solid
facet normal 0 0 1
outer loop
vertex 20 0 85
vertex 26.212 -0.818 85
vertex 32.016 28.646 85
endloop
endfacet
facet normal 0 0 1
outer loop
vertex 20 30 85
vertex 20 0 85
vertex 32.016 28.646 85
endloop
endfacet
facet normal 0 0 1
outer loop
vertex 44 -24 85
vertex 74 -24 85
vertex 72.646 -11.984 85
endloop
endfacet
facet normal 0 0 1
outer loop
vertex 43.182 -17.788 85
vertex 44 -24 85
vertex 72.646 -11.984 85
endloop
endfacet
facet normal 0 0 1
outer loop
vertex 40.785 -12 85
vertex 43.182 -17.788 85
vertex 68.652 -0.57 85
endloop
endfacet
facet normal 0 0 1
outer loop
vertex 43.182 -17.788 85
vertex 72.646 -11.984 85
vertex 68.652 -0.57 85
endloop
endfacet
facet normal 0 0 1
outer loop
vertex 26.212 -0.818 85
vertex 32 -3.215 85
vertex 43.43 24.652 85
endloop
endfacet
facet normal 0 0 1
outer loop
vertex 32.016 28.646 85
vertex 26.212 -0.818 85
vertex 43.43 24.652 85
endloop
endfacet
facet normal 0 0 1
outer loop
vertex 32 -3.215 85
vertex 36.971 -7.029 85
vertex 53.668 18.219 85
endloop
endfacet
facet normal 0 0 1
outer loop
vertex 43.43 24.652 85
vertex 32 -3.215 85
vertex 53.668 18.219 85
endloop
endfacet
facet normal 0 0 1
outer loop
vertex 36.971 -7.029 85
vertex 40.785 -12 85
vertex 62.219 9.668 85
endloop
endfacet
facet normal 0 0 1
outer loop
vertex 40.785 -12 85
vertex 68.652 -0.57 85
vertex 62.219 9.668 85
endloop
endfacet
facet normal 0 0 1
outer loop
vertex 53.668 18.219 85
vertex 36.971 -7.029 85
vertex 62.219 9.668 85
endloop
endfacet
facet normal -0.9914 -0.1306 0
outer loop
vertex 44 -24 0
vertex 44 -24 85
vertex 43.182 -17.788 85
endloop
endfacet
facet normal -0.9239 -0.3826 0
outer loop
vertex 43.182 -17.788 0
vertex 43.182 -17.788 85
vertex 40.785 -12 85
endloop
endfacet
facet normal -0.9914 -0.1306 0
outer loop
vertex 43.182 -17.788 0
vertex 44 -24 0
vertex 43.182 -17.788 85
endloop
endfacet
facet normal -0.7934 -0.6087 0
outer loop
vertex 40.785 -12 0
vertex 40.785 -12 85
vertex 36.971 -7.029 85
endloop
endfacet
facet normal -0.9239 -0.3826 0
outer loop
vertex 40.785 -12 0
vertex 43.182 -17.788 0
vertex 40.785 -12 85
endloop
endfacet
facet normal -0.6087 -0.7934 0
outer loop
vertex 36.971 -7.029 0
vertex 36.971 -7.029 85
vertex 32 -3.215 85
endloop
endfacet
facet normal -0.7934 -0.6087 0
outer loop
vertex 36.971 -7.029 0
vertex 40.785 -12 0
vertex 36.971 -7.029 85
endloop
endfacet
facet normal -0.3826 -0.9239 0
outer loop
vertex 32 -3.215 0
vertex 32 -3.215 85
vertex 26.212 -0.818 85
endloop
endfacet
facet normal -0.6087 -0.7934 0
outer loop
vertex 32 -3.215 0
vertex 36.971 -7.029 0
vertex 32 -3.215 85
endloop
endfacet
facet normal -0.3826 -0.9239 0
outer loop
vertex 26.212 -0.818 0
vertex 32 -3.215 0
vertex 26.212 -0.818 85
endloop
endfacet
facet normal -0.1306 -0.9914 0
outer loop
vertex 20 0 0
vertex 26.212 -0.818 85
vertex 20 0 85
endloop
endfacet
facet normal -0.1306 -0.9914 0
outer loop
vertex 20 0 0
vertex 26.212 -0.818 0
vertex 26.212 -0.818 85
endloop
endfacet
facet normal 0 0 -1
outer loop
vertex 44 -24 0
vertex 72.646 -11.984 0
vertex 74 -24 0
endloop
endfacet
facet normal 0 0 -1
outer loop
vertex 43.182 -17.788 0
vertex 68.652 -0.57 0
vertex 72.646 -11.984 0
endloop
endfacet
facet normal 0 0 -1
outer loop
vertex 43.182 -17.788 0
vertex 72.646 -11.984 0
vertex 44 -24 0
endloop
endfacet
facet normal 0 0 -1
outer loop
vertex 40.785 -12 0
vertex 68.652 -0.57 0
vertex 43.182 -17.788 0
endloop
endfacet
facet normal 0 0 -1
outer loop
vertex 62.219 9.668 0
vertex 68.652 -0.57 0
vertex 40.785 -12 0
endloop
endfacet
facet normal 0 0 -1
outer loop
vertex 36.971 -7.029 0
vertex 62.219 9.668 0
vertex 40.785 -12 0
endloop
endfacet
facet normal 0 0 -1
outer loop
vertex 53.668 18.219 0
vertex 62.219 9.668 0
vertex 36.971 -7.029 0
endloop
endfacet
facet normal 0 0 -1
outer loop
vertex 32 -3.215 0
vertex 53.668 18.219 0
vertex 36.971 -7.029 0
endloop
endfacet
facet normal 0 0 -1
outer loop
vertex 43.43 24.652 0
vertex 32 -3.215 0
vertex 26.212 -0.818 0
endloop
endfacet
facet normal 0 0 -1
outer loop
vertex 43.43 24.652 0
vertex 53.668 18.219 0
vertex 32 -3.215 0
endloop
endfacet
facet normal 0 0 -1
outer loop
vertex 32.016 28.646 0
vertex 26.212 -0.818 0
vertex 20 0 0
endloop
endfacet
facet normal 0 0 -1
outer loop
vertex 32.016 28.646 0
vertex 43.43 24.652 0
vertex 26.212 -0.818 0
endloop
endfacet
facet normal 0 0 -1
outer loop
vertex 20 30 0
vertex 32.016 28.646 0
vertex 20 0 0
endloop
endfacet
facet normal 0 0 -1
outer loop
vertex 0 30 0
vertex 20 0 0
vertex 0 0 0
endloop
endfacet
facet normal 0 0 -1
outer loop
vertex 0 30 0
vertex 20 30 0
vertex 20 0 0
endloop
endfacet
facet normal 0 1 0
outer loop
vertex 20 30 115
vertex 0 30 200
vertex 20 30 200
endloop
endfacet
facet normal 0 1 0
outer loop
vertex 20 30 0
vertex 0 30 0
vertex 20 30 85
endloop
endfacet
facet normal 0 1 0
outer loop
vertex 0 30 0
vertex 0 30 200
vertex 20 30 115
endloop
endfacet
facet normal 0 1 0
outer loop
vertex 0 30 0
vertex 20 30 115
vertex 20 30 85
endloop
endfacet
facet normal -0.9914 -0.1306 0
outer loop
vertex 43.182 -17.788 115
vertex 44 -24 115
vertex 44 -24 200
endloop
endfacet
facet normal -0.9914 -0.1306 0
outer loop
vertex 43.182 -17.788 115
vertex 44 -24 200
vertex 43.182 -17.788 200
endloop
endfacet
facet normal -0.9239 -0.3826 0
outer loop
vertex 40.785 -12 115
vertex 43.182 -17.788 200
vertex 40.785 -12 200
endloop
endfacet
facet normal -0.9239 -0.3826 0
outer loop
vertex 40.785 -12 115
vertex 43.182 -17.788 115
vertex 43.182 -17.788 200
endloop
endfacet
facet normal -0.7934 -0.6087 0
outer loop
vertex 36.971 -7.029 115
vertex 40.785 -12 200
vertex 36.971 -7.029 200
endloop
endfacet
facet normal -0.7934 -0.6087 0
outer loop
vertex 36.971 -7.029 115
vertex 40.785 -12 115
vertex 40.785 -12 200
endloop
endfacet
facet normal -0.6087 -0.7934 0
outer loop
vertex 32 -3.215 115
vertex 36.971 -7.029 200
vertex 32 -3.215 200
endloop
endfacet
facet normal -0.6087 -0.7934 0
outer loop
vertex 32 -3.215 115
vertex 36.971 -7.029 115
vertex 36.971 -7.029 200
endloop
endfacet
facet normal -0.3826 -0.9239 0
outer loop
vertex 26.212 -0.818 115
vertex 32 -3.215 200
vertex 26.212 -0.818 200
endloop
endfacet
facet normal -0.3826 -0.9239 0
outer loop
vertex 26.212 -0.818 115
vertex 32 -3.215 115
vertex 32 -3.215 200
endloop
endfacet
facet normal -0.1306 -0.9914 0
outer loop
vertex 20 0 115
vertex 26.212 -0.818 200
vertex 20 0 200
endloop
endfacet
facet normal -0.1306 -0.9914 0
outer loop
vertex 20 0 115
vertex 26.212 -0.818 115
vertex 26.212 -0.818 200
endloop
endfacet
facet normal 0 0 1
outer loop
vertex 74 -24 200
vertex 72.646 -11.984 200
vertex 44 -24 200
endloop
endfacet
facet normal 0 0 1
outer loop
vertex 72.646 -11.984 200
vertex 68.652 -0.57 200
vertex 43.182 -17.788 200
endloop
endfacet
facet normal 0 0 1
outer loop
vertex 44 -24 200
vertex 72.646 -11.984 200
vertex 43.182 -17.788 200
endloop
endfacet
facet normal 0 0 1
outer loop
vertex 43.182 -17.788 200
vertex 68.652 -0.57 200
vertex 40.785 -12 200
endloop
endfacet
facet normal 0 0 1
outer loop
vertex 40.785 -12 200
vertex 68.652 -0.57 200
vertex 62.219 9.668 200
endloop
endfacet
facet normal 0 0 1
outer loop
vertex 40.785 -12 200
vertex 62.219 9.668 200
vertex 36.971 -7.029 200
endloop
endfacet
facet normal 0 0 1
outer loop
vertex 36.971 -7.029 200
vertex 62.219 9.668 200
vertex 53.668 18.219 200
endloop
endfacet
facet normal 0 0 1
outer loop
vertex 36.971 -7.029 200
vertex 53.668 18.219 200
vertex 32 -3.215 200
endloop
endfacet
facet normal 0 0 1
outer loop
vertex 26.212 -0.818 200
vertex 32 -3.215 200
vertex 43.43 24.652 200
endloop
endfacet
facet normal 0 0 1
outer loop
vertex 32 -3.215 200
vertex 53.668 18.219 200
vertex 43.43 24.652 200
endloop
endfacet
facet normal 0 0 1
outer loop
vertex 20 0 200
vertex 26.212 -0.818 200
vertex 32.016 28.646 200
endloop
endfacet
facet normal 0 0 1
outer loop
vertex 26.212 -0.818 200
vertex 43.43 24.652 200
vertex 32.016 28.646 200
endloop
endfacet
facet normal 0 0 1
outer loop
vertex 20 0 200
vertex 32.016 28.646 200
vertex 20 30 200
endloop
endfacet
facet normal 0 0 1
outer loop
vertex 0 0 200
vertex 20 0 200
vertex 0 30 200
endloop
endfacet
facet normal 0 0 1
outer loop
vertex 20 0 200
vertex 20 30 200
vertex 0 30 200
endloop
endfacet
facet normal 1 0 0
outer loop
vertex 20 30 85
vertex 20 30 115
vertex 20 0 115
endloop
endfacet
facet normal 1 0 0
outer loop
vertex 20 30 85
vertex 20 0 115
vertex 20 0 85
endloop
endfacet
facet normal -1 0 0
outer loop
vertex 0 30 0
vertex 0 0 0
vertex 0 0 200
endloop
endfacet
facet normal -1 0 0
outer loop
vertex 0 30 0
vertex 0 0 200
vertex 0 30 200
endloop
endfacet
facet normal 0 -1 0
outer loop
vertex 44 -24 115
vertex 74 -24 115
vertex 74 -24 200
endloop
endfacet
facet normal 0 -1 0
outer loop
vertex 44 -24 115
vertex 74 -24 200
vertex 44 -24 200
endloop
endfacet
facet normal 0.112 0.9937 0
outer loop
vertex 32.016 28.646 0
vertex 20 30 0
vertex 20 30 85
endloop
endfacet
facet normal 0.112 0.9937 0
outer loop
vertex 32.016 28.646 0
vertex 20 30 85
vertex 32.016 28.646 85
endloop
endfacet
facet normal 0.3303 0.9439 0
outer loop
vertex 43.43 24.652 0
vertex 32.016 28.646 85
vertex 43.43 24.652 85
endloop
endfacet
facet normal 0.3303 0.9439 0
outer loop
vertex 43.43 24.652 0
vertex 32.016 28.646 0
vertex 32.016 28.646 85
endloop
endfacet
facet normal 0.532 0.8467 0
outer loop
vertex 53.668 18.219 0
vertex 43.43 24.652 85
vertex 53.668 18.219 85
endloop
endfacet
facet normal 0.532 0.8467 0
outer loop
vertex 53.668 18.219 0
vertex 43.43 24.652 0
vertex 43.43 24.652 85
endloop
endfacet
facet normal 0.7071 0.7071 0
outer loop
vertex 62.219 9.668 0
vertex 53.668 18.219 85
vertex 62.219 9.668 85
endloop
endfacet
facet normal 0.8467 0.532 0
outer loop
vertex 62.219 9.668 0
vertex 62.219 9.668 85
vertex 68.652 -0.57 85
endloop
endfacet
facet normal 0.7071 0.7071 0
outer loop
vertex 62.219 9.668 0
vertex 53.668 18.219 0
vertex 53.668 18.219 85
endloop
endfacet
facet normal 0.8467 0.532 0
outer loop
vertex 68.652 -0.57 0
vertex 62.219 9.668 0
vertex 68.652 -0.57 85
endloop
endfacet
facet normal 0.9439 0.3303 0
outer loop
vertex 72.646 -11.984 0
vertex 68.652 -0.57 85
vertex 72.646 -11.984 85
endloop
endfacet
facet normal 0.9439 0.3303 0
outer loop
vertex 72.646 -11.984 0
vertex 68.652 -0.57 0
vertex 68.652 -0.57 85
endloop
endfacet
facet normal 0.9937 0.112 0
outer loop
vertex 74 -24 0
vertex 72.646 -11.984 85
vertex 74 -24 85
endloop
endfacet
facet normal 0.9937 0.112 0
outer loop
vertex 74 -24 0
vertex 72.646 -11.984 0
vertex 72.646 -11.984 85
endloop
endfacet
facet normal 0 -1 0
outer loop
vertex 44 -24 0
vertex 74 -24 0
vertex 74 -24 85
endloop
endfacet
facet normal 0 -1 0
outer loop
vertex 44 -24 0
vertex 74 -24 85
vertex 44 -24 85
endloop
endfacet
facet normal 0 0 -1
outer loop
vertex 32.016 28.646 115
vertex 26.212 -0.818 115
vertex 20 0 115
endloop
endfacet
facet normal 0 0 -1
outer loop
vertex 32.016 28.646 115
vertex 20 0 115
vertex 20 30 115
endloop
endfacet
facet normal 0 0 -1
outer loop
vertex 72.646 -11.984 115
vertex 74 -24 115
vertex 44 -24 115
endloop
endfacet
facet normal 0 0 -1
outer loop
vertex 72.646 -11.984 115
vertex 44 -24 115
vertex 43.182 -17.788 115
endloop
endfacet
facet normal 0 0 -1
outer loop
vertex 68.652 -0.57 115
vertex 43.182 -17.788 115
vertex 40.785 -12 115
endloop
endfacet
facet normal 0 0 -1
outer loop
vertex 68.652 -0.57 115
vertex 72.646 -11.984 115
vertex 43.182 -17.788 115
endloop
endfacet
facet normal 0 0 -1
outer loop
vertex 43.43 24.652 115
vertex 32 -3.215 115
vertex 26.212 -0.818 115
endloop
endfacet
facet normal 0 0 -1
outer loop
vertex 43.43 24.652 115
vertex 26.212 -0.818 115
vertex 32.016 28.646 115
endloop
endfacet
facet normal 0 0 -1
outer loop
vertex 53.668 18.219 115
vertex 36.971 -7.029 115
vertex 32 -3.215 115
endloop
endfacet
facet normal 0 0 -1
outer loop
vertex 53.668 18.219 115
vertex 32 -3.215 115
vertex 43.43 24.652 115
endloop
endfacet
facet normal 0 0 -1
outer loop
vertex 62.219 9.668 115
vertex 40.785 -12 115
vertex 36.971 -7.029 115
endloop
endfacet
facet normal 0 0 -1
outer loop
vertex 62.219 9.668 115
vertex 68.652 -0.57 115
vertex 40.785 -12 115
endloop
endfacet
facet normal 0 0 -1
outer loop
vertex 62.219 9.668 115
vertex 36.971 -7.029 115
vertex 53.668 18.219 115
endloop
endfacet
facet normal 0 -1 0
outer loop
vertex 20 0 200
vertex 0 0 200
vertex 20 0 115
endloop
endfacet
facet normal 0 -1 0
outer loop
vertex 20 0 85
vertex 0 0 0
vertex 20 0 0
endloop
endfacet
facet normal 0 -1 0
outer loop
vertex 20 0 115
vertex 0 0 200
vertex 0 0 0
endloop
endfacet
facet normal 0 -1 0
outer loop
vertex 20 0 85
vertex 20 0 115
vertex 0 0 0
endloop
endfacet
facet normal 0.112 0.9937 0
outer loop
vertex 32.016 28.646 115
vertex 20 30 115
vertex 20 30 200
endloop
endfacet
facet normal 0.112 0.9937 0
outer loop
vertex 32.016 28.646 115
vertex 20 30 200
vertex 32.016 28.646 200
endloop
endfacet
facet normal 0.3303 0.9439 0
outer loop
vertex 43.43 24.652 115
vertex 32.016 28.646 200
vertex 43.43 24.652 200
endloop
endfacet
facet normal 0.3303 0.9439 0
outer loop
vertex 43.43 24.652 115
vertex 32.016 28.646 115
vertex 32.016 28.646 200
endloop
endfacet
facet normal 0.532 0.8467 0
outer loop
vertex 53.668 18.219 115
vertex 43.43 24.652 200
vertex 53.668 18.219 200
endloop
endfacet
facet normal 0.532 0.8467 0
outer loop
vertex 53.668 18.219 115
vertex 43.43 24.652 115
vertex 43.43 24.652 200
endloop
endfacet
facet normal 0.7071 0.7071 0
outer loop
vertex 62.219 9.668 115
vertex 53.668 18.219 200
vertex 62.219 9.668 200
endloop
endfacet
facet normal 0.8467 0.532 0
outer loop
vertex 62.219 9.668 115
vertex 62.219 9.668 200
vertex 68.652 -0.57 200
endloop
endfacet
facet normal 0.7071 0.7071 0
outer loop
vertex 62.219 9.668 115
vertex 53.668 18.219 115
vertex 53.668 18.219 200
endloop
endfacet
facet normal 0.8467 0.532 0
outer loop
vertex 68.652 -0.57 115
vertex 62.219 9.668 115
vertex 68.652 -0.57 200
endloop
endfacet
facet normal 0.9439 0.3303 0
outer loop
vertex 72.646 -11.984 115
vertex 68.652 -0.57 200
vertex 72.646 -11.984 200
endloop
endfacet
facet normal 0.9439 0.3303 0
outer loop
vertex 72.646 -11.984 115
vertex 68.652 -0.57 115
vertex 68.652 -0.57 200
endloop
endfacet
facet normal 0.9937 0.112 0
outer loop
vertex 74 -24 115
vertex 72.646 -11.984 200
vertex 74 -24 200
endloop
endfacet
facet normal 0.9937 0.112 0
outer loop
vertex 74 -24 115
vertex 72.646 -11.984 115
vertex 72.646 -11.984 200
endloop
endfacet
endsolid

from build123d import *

# Parameters (mm, degrees)
SKETCH_1_W          = 20
SKETCH_1_H          = 30
EXTRUDE_1_DEPTH     = 200
EXTRUDE_2_DEPTH     = 200
SKETCH_2_W          = 30
SKETCH_2_H          = 79.389115132
CUT_EXTRUDE_1_DEPTH = 54


with BuildPart() as part:
    # 草图1 → 凸台-拉伸1 (new body)
    with BuildSketch(Plane.XY):
        with Locations((10, 15)):
            Rectangle(SKETCH_1_W, SKETCH_1_H)
    extrude(amount=EXTRUDE_1_DEPTH)

    # 草图1<3> → 凸台-拉伸2 (add)
    with BuildSketch(Plane.XY):
        with BuildLine():
            ThreePointArc((20, 0), (36.970562748, -7.029437252), (44, -24))
            Line((44, -24), (74, -24))
            ThreePointArc((74, -24), (58.183766184, 14.183766184), (20, 30))
            Line((20, 30), (20, 0))
        make_face()
    extrude(amount=EXTRUDE_2_DEPTH)

    # 草图2 → 切除-拉伸1 (cut)
    with BuildSketch(Plane(origin=(74, 0, 0), x_dir=(0, 0, -1), z_dir=(1, 0, 0))):
        with Locations((-100, 15.694557566)):
            Rectangle(SKETCH_2_W, SKETCH_2_H)
    extrude(amount=-CUT_EXTRUDE_1_DEPTH, mode=Mode.SUBTRACT)


solid = part.part
